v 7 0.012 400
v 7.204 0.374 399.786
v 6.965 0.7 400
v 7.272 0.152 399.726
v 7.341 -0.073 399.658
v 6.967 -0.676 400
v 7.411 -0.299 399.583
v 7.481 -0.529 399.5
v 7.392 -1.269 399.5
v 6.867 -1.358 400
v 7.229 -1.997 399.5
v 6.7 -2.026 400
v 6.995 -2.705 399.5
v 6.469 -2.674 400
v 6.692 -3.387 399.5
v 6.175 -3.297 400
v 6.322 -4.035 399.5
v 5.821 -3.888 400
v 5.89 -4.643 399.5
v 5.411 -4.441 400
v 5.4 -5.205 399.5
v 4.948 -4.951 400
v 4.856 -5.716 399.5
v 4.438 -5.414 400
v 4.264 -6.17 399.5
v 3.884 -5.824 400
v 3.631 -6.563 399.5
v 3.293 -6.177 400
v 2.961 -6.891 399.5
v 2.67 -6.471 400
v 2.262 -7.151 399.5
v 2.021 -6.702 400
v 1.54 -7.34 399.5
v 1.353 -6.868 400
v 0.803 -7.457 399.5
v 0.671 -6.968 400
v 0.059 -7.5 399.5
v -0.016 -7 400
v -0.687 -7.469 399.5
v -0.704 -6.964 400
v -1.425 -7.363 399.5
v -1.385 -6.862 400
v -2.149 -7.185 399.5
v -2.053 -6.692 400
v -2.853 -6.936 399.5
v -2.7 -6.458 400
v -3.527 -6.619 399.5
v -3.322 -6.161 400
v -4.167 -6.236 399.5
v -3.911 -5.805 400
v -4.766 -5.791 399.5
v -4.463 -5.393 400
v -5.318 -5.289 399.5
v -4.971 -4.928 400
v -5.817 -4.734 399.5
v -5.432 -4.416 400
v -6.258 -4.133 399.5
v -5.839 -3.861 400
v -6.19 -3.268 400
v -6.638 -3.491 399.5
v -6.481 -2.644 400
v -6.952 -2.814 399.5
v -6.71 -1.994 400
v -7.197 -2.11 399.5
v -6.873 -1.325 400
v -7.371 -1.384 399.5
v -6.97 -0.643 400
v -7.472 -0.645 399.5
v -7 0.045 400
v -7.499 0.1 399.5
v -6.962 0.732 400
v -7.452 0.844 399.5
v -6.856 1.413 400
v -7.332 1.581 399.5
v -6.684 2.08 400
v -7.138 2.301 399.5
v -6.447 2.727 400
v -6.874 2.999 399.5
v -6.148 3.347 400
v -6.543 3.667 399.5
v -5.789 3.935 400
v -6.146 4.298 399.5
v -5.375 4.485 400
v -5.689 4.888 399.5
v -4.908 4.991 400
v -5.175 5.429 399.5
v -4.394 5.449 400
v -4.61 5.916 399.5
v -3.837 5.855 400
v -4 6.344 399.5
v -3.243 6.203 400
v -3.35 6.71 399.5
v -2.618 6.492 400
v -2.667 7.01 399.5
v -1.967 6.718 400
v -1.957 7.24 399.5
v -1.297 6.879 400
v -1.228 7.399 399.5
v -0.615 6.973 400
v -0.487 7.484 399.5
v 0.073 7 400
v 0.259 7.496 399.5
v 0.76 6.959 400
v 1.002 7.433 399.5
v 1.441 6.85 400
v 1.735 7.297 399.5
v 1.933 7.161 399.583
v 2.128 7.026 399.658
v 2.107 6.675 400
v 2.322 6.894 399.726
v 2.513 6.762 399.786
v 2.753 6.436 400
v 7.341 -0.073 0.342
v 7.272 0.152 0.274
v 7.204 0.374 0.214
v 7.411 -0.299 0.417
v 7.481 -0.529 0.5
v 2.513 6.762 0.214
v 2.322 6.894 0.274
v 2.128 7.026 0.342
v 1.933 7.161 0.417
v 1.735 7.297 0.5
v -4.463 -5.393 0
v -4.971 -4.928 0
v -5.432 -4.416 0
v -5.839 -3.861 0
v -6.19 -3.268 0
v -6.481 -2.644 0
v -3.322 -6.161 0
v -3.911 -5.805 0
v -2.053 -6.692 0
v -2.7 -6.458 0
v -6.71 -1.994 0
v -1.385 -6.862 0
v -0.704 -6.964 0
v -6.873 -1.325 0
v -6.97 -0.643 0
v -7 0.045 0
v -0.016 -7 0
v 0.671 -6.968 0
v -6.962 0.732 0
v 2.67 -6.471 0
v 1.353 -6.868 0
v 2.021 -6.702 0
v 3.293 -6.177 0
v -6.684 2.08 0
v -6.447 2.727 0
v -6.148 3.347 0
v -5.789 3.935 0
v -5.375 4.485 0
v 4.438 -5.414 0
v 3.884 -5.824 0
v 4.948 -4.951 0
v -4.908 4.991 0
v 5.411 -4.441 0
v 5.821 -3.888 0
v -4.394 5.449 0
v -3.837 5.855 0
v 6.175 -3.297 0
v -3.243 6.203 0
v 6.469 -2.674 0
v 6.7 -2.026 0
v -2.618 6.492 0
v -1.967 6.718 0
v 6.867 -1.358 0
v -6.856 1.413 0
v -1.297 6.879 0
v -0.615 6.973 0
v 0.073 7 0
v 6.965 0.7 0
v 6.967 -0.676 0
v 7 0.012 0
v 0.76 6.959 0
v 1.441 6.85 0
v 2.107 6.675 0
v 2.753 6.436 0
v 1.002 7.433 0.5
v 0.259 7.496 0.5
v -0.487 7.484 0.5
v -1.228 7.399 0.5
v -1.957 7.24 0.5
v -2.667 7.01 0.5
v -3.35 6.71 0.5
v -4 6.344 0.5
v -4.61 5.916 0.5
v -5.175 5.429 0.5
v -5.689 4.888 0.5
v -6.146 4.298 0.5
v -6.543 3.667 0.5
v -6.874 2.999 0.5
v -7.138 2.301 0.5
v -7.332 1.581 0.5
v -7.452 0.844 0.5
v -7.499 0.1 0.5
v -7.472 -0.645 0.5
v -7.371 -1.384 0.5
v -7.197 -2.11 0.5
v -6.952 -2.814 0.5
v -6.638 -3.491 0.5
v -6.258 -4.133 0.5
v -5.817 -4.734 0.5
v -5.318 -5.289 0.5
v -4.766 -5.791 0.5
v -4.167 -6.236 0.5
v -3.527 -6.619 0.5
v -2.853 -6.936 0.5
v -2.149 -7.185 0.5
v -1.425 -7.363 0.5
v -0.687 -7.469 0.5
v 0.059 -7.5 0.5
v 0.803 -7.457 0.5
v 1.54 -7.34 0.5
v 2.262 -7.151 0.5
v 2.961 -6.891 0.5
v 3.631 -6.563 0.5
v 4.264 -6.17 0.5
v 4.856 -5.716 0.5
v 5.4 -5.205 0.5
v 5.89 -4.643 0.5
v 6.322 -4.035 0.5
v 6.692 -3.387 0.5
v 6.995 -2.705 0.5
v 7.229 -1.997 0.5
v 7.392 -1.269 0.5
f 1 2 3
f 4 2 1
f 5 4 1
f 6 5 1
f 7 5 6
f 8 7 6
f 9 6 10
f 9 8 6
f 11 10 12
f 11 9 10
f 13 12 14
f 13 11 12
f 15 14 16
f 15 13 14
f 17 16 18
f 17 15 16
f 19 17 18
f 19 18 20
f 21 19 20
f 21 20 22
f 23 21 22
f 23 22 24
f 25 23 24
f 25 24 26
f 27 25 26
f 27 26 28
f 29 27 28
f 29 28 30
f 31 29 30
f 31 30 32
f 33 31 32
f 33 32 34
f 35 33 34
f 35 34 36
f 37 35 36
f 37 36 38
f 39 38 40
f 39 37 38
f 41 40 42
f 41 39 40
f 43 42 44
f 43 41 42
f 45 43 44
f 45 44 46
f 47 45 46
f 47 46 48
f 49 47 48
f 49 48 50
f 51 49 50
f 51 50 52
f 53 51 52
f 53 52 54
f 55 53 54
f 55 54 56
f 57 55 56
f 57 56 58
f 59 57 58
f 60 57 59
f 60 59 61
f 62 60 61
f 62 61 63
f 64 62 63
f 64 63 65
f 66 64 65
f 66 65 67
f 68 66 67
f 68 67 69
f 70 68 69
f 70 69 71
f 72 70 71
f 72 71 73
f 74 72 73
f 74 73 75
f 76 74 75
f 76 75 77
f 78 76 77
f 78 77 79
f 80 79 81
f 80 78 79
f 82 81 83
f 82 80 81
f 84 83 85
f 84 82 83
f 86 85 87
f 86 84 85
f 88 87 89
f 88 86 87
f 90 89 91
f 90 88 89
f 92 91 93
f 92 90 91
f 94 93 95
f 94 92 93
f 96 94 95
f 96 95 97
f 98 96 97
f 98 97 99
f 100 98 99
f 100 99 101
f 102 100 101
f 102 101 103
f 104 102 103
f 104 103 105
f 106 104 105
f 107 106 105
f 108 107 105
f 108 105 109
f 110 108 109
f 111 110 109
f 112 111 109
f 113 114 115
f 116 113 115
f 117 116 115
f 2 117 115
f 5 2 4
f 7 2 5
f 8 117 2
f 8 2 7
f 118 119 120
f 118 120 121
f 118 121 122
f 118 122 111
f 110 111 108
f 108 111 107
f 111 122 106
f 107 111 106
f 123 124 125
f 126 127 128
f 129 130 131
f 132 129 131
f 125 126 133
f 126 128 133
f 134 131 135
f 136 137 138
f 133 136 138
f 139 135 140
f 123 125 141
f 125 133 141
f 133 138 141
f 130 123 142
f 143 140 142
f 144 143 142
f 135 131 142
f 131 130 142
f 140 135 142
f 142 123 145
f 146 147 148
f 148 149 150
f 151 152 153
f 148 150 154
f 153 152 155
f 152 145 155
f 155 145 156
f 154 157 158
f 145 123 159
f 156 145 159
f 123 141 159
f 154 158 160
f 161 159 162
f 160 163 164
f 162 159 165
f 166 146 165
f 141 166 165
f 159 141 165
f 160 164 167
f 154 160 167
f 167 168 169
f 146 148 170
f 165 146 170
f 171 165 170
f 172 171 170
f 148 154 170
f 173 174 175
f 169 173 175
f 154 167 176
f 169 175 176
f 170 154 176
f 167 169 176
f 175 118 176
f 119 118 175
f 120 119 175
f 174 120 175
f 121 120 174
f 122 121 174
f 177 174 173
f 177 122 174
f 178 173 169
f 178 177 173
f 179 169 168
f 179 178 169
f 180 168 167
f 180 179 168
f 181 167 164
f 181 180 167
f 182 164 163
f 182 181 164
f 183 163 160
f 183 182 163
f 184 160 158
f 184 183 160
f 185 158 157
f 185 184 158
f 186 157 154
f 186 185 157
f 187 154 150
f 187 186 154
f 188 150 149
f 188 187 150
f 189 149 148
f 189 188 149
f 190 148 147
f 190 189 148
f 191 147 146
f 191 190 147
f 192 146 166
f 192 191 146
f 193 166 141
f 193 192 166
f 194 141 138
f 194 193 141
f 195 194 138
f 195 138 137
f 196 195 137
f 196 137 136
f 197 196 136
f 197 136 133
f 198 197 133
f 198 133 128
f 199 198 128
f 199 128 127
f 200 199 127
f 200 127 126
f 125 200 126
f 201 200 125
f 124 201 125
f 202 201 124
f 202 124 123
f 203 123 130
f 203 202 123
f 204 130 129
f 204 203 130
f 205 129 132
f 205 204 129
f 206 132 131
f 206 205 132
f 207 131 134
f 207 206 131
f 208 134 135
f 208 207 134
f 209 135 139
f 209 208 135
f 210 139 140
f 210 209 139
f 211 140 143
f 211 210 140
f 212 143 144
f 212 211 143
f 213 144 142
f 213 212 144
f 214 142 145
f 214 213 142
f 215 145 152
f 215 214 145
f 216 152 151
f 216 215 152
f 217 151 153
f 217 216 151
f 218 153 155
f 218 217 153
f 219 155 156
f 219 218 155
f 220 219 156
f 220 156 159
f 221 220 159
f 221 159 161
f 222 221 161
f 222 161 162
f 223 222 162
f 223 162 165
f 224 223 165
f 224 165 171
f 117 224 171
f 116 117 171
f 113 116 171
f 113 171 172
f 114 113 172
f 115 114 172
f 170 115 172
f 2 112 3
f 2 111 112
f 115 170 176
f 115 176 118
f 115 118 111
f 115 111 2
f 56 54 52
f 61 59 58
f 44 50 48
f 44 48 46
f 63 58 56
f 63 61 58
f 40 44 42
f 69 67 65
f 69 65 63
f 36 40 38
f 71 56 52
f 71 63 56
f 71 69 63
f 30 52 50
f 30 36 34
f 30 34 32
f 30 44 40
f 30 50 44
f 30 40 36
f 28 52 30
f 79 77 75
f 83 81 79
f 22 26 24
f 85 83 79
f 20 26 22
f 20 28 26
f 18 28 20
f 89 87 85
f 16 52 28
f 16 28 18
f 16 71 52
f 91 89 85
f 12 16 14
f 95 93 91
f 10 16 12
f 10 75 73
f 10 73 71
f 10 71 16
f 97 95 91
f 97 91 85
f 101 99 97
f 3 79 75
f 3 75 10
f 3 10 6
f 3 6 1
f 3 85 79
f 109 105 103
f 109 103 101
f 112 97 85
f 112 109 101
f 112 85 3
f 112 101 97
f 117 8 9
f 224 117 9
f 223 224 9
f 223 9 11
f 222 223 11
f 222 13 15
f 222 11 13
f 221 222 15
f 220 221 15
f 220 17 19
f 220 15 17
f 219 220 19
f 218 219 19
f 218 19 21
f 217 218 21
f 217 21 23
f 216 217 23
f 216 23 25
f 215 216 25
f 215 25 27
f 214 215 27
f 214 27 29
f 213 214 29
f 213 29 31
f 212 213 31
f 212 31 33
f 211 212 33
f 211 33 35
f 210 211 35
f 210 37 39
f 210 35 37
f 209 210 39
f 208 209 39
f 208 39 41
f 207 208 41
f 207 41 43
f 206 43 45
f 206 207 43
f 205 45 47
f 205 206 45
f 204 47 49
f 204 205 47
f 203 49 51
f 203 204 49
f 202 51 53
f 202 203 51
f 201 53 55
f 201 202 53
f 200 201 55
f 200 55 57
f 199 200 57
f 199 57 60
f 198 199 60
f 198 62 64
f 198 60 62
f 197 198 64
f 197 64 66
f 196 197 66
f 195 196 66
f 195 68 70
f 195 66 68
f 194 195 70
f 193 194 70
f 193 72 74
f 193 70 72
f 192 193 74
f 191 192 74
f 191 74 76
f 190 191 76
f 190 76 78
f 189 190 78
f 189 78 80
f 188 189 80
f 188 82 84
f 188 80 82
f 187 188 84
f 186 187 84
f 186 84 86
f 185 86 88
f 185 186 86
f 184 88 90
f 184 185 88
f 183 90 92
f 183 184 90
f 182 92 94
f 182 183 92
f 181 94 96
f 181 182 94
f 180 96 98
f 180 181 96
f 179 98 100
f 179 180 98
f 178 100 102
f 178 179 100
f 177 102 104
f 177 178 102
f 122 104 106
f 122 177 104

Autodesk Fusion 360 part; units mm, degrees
sketch "Sketch1" plane through (0, 0, 0) normal (0, 0, 1) x (1, 0, 0)
  circle A0 centre (0, 0) radius 7.5
  line L0 (2.2175, 7.1647) -> (7.4999, -0.0289)
  dimension "d1" = 15
extrude "Extrude1" add sketch "Sketch1" along normal blind 400 contours A0 L0 picked at (-0.1624, -2.0405)
chamfer "Chamfer1" distance 0.5 angle 45 1 faces at (7.461, -0.7641, 133.3333)
sketch "Sketch2" plane through (0, 0, 400) normal (0, 0, 1) x (-1, 0, 0)
  arc A0 (-2.7525, -6.4361) -> (-6.9649, -0.6997) centre (0, 0) ccw
  line L0 (-6.9649, -0.6997) -> (-2.7525, -6.4361)
